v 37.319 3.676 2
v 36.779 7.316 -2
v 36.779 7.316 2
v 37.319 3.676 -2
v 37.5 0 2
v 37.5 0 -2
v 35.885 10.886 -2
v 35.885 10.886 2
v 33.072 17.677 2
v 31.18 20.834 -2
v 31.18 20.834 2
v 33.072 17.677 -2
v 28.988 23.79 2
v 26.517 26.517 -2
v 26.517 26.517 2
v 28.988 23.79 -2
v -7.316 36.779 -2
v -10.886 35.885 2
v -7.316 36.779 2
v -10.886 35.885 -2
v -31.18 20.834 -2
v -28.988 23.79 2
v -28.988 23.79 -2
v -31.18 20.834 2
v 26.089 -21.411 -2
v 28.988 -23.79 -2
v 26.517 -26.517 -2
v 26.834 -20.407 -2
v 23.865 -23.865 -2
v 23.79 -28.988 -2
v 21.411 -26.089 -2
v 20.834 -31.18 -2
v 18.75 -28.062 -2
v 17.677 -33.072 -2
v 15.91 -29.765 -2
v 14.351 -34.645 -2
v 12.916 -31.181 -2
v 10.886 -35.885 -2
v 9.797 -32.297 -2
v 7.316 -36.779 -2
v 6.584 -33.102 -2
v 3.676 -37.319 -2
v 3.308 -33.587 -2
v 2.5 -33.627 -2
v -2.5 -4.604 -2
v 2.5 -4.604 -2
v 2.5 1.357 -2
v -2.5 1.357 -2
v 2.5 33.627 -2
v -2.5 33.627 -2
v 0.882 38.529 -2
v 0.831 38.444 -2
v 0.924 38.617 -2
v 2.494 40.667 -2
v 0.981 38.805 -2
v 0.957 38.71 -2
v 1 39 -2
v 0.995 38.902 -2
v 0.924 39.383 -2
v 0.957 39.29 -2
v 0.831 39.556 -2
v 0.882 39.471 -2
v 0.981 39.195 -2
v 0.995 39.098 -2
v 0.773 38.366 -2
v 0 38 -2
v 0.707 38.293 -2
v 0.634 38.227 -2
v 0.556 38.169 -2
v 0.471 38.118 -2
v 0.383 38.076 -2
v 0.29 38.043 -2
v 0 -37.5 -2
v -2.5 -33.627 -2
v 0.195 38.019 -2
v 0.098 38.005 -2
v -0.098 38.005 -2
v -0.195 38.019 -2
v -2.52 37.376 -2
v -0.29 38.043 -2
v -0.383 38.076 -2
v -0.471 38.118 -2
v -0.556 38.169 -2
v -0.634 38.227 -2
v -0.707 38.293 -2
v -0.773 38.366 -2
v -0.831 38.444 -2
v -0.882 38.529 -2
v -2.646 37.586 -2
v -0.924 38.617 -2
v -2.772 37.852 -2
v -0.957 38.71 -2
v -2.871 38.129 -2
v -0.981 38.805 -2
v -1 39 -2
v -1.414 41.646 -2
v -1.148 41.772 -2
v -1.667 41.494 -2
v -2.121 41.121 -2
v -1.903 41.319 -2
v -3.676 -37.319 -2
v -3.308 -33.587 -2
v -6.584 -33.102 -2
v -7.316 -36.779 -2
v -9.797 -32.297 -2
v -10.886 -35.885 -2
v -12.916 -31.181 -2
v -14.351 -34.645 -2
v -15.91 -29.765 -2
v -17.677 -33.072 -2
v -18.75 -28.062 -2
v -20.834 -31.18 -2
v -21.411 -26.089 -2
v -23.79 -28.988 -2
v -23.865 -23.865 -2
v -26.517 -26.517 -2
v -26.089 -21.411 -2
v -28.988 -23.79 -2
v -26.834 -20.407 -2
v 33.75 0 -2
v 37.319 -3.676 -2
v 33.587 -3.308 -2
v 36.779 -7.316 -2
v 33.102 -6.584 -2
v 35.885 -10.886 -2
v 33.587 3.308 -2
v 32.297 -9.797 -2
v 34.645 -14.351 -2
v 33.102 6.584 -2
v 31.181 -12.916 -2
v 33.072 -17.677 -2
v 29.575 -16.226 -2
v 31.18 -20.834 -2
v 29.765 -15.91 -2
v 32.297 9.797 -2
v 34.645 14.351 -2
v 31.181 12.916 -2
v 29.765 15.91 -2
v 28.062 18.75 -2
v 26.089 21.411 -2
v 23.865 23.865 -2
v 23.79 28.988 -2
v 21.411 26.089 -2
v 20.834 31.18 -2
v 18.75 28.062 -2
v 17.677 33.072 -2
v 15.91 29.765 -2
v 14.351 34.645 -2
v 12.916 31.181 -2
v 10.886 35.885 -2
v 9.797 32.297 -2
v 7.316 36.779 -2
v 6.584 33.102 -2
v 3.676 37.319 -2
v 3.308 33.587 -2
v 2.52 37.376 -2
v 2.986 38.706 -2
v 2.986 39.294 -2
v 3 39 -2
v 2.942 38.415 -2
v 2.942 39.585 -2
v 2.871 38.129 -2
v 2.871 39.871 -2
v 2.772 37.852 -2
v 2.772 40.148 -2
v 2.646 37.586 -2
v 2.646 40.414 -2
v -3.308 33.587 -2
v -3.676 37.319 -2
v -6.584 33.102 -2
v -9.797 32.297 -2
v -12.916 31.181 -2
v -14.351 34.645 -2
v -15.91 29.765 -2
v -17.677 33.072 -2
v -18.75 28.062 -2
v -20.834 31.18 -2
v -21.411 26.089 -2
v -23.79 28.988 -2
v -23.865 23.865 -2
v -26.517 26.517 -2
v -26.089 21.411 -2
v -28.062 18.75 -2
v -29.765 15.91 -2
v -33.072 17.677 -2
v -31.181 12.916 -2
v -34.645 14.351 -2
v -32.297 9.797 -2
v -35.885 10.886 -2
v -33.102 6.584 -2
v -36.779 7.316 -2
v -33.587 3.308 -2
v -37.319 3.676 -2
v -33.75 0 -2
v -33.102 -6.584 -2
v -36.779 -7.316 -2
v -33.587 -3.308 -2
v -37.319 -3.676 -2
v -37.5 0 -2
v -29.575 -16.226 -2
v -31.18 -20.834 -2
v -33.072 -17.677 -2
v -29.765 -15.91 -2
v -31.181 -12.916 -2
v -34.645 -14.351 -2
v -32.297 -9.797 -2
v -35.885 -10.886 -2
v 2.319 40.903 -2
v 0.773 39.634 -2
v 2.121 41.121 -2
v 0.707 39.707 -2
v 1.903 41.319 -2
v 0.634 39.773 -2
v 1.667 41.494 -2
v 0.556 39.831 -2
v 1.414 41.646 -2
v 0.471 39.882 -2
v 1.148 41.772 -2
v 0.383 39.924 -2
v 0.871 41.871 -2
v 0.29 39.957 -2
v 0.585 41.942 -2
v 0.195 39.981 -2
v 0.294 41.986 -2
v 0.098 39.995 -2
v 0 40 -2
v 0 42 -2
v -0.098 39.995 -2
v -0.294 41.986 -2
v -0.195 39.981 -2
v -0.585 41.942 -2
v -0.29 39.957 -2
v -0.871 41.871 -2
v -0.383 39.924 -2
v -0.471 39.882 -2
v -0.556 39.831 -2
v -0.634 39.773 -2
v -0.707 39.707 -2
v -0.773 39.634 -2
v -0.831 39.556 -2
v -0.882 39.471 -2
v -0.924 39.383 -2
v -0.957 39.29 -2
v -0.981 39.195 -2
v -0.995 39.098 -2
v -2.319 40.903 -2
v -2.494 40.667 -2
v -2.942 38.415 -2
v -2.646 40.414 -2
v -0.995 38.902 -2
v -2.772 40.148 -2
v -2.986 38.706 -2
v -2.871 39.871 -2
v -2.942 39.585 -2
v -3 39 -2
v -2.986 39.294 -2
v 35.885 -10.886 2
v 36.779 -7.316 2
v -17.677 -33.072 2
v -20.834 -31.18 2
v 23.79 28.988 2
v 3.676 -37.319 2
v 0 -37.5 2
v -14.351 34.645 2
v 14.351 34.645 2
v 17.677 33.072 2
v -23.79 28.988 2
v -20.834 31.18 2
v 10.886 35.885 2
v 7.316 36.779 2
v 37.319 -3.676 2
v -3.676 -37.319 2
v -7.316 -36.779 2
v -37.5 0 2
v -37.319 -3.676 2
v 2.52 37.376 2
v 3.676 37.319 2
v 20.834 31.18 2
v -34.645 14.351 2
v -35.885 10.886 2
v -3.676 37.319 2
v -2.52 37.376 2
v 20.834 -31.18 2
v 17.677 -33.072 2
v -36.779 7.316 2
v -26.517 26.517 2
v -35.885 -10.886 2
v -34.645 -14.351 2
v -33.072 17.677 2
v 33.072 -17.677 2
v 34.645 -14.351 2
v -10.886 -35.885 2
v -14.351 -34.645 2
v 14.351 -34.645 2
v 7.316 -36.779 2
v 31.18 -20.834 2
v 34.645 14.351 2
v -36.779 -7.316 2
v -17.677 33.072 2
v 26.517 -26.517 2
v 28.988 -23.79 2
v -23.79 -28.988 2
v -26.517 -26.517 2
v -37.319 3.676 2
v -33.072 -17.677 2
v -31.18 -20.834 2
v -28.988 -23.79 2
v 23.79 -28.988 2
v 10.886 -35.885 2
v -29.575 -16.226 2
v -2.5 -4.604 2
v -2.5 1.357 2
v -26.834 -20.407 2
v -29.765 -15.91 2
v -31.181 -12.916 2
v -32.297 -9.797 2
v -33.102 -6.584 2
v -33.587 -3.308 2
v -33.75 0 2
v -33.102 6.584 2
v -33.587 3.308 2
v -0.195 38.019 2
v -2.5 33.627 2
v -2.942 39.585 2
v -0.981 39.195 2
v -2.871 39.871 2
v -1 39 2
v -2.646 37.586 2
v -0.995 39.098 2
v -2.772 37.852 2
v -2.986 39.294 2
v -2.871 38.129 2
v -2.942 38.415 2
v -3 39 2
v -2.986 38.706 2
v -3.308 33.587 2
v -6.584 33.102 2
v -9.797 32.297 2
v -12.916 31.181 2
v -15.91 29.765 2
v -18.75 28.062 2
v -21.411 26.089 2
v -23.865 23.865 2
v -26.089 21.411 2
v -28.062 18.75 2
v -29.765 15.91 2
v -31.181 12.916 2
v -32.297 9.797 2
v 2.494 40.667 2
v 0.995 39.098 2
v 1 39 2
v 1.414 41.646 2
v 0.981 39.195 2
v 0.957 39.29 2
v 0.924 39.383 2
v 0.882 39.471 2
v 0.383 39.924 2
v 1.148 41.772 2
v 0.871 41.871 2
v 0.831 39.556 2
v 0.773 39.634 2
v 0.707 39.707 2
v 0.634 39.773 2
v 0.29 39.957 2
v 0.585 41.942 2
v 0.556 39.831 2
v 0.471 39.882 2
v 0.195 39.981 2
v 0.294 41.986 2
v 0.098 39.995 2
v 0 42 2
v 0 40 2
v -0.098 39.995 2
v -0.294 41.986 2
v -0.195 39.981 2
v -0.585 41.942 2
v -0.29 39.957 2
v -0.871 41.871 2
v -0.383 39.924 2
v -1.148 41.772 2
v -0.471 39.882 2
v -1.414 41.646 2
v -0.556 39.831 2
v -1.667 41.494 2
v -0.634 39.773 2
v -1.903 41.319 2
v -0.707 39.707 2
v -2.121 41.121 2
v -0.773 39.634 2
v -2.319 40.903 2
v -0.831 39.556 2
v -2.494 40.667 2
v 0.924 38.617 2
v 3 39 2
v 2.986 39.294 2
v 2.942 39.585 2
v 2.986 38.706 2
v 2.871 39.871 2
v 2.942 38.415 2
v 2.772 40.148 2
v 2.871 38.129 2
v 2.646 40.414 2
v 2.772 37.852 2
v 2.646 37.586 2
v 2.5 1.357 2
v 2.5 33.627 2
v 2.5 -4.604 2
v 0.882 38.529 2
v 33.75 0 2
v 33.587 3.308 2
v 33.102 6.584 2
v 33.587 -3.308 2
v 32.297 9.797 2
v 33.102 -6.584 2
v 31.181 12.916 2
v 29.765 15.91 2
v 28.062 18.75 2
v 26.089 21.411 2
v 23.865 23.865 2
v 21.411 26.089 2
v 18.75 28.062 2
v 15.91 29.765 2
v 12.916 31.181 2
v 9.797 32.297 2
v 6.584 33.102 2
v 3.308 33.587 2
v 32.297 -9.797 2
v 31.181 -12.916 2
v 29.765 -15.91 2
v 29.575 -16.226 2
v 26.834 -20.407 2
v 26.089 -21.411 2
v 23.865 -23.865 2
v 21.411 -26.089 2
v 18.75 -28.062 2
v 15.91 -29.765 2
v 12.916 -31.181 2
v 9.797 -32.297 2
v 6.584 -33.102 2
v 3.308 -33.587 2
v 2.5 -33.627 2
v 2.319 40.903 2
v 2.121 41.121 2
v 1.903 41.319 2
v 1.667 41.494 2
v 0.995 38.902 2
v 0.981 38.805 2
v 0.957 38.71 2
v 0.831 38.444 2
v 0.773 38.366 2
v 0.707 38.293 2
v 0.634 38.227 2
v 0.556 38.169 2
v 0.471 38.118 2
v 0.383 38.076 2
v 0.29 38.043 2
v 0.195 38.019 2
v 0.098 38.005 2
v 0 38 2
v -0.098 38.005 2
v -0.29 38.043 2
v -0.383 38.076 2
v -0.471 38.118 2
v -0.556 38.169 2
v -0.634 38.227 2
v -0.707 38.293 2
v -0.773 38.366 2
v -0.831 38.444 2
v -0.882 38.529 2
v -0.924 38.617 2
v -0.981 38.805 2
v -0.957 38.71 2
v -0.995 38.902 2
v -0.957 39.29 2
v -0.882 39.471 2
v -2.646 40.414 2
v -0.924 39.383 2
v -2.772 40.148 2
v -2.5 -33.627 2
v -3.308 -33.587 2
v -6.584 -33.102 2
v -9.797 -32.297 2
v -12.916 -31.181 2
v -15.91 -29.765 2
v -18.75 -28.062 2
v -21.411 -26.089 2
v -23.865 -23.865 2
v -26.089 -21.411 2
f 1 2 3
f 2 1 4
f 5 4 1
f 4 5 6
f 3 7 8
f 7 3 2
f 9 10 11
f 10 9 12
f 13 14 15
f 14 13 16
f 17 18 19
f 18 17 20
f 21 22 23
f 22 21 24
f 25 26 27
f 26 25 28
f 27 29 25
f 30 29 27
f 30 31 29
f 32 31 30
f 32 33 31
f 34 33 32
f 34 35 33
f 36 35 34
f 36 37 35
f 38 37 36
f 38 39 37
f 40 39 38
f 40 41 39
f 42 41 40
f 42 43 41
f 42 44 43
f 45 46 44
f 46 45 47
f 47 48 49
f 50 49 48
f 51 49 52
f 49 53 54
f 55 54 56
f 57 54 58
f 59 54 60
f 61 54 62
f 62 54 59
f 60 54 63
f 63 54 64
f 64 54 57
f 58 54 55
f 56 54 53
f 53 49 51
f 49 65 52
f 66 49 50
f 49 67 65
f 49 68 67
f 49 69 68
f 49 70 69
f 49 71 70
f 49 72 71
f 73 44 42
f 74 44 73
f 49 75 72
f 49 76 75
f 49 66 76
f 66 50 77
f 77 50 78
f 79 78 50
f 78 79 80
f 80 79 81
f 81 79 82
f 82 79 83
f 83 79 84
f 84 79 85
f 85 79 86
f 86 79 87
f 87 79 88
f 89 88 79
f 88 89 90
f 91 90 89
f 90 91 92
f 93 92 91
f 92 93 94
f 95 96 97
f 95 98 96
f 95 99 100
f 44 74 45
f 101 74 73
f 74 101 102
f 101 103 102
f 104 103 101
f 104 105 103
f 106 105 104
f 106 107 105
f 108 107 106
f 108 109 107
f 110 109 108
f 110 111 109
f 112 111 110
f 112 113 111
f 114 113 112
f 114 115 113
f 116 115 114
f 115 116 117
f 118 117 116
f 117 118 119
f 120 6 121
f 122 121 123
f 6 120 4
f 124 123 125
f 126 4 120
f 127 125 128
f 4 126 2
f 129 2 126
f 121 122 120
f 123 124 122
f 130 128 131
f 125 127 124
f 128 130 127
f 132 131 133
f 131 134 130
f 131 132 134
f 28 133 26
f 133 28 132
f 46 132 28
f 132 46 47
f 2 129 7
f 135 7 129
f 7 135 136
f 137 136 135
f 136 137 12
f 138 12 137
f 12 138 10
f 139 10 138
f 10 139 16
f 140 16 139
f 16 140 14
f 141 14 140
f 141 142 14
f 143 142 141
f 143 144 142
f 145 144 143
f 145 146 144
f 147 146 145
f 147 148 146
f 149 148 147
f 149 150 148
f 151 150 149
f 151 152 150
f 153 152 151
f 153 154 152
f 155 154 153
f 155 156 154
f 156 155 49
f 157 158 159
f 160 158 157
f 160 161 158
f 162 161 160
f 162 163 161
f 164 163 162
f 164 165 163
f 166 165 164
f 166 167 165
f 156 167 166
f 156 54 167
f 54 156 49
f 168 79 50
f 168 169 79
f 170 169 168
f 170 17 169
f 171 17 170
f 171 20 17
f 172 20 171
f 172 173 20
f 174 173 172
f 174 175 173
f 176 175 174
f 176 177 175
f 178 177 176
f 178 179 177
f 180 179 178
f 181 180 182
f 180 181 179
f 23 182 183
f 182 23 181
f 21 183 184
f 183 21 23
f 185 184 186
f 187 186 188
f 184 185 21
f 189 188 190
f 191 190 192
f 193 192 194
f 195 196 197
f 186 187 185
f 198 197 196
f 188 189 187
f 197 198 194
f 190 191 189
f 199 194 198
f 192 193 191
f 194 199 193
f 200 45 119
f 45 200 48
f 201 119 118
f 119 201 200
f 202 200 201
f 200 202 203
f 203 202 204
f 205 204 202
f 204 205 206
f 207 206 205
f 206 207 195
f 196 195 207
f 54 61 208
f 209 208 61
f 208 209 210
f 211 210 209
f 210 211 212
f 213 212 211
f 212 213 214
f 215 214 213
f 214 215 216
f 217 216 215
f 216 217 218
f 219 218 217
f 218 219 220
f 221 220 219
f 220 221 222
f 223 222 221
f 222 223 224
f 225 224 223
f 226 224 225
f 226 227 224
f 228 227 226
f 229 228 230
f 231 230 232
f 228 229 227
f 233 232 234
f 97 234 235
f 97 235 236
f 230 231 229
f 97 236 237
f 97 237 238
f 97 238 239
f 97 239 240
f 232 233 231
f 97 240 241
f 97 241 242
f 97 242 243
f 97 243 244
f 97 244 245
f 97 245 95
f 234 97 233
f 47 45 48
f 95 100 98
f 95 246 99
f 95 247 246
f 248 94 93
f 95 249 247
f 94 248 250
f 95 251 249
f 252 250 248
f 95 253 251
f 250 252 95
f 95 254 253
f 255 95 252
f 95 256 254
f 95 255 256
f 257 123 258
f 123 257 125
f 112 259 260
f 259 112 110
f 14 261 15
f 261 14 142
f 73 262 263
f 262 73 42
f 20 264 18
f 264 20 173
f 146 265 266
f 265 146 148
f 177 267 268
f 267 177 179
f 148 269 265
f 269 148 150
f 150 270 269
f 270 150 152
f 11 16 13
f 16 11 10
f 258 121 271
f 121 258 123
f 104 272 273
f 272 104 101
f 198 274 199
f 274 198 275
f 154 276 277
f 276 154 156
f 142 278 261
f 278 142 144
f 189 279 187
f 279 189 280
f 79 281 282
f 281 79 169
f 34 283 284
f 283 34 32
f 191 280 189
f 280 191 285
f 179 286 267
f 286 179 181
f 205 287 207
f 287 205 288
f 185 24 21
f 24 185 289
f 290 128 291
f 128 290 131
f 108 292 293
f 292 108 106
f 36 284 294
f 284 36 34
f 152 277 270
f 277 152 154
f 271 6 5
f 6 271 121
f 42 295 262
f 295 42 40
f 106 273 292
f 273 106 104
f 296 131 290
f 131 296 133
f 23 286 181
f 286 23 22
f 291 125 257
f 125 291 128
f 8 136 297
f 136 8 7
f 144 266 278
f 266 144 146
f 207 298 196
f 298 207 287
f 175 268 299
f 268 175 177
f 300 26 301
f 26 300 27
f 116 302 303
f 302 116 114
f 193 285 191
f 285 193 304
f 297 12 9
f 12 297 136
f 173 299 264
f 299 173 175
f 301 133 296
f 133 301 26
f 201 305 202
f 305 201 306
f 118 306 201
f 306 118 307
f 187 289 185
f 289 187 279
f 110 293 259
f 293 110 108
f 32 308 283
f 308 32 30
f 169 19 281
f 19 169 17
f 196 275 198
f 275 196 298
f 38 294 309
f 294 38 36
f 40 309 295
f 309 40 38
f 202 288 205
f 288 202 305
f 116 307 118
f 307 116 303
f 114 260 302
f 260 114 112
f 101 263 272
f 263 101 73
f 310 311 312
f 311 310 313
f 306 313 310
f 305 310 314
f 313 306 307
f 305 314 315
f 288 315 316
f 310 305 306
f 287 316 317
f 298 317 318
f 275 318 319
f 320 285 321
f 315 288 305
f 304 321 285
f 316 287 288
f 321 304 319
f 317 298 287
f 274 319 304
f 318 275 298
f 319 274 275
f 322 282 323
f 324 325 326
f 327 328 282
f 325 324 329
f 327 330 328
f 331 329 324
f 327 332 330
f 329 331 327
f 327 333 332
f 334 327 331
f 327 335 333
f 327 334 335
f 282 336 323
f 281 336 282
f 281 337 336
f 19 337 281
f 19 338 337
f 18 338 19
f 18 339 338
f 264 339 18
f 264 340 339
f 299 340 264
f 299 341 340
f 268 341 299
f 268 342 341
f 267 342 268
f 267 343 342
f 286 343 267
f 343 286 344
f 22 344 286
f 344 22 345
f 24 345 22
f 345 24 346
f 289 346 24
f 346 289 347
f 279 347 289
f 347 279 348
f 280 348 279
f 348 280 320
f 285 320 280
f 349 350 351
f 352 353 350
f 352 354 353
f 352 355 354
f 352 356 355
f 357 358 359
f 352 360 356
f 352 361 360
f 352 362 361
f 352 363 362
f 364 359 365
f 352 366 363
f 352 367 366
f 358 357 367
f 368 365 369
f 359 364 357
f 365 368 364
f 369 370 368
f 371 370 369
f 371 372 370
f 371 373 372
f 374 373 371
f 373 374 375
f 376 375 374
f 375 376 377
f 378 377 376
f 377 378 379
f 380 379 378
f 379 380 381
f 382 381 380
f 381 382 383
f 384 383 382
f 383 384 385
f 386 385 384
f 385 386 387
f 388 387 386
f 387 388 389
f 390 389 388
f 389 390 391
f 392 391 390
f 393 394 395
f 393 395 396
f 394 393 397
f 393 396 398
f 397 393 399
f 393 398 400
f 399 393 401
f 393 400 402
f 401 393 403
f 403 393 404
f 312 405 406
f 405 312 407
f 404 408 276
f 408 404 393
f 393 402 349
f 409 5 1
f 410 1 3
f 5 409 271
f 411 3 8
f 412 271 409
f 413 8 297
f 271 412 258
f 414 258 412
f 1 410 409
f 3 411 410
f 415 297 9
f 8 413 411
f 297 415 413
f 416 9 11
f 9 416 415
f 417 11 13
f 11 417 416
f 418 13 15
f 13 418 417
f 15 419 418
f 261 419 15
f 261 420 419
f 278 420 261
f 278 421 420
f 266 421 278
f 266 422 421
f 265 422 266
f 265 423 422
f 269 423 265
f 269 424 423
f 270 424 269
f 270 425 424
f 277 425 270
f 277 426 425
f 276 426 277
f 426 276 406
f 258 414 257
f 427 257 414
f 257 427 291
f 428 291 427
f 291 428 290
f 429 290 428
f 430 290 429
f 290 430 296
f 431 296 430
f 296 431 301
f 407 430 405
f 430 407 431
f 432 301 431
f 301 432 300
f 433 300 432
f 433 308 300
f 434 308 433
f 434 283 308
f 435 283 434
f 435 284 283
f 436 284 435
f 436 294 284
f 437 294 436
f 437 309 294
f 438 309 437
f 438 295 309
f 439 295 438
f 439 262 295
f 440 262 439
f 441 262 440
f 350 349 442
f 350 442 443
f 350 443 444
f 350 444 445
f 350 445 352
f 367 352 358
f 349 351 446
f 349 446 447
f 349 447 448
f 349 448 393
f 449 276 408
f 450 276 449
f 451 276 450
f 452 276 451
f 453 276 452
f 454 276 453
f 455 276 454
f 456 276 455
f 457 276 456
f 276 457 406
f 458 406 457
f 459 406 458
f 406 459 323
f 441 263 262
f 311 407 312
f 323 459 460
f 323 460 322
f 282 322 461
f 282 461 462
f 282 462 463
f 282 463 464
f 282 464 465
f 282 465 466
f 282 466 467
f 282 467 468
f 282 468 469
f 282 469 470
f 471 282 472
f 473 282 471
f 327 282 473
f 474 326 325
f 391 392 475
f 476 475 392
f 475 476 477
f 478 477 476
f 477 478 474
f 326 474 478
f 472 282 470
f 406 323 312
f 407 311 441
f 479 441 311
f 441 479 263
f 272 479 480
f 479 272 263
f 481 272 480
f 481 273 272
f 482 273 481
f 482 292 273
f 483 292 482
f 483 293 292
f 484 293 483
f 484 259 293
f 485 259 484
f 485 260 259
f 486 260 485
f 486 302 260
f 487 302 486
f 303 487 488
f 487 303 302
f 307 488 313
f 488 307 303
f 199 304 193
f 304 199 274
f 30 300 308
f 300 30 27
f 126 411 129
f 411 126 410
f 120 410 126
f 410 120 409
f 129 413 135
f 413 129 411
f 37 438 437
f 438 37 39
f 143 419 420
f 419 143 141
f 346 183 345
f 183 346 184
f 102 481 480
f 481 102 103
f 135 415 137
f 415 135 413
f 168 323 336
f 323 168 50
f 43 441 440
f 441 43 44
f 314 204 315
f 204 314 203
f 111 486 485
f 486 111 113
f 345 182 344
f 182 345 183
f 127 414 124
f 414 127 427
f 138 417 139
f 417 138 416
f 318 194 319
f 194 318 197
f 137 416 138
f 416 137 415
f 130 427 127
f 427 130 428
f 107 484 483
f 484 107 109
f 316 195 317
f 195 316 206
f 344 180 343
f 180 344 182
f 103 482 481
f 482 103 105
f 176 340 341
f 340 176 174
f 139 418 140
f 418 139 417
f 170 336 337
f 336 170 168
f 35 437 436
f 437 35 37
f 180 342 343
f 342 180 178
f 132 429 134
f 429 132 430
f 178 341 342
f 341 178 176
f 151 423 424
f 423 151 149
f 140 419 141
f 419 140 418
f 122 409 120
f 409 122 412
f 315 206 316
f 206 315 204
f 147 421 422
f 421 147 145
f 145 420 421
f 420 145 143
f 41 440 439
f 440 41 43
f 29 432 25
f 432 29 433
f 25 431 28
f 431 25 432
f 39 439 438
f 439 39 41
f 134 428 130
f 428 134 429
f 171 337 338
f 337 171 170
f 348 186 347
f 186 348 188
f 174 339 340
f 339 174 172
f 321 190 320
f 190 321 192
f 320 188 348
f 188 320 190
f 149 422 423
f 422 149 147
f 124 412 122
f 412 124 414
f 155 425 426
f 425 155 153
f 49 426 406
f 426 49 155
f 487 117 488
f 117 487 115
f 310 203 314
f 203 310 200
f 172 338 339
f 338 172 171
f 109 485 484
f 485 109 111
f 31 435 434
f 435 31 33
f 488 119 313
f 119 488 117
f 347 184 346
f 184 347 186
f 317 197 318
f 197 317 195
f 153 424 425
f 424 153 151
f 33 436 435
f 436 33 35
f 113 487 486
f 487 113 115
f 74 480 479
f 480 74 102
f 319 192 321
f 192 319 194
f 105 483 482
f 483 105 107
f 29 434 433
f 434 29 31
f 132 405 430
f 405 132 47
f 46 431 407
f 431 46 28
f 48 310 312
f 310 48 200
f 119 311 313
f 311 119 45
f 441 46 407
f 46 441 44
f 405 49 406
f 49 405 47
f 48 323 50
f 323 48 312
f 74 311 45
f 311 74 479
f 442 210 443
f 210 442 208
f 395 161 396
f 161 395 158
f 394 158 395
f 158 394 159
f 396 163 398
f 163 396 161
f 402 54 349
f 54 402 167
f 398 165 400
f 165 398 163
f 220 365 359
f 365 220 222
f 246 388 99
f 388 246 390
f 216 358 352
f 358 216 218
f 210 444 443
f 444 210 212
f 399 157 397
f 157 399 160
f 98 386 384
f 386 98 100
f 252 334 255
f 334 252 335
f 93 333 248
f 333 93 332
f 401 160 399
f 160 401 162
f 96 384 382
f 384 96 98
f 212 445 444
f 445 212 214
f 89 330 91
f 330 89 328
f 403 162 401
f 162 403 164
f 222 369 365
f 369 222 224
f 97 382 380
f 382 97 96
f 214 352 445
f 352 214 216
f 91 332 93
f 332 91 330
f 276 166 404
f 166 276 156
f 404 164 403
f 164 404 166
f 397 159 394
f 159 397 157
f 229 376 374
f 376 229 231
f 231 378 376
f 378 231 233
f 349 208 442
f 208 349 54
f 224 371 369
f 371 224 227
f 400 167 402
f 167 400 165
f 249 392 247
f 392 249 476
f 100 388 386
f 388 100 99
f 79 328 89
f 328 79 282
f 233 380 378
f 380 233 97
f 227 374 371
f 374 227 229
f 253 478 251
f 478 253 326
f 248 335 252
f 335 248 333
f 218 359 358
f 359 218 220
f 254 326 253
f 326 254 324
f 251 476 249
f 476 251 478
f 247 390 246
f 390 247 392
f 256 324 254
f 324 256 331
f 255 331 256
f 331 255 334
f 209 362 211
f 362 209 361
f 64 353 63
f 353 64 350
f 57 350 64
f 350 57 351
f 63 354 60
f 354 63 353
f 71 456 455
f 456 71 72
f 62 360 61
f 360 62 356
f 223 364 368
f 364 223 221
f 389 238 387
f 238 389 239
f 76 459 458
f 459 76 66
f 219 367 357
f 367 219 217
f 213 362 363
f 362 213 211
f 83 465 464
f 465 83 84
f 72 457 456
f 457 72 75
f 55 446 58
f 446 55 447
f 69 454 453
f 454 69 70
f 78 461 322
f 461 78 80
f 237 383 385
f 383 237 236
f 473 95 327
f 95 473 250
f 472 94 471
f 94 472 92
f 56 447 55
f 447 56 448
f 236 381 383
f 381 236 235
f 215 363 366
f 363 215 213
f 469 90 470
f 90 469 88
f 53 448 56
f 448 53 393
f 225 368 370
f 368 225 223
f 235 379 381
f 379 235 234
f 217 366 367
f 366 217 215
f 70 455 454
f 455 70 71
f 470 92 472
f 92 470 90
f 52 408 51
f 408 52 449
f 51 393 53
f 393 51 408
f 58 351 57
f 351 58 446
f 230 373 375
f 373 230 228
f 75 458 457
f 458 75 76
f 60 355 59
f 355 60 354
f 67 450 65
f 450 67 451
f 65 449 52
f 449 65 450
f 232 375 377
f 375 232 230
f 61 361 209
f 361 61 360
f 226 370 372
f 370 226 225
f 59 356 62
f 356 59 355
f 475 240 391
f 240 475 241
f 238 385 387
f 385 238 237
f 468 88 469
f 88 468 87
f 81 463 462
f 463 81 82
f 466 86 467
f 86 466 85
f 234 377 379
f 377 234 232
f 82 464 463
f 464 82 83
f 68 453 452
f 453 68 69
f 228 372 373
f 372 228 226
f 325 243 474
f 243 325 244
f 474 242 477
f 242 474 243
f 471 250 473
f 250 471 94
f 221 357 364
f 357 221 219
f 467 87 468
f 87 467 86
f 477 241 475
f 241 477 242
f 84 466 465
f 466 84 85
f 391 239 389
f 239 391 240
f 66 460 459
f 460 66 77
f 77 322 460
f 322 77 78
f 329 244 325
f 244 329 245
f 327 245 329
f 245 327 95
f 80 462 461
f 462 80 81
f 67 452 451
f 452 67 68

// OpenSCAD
$fn=64+0;

// Diameter (mm)
diameter=75;  // [10:1000]
// Rim amount (%)
rim=10; //[1:99]
// Thickness (mm)
thickness=4;     // [1:25]
// Width of interior beams (mm)
beamw=5;  //[1:25]  

// Angle of "wings" (degrees)
angle=33; //[0:359]

// size of attachment point (0=none)
attach_radius=3;  //[0:10]
// size of attachment hole
attach_hole=1;  //[0:9]
// Shape
circular=1;  // [1:Circular, 0: Eliptical]
// Eliptical stretch factor (Golden Ratio=1.618)
factor=1.618; 



r=diameter/2;



module attach() {
  difference() {
    cylinder(r=attach_radius,h=thickness,center=true);
		cylinder(r=attach_hole,h=thickness+1,center=true);
   }
}

module ring() {
   difference() {
     cylinder(r=r,h=thickness,center=true);
		 cylinder(r=(100-rim)/100*r,h=thickness+1,center=true);
     }
}

module groovy() {
	union() {
 	  ring();
		rotate([0,0,-angle]) translate([0,-beamw/2,-thickness/2]) cube([r*.95,beamw,thickness],center=false);
		rotate([0,0,angle]) translate([-r*.95,-beamw/2,-thickness/2])  cube([r*.95,beamw,thickness],center=false);
	  cube([beamw,diameter*.95,thickness],center=true);
   }
}

union() {
if (circular==0) {
  scale([1,factor,1]) groovy();
// don't want to scale the attach point
// but do need to adjust the amount to move
  if (attach_radius!=0) translate([0,r*factor+attach_radius/2,0]) attach();
}
else {
  groovy();
// don't want to scale the attach point
// but do need to adjust the amount to move
  if (attach_radius!=0) translate([0,r+attach_radius/2,0]) attach();
}

}
